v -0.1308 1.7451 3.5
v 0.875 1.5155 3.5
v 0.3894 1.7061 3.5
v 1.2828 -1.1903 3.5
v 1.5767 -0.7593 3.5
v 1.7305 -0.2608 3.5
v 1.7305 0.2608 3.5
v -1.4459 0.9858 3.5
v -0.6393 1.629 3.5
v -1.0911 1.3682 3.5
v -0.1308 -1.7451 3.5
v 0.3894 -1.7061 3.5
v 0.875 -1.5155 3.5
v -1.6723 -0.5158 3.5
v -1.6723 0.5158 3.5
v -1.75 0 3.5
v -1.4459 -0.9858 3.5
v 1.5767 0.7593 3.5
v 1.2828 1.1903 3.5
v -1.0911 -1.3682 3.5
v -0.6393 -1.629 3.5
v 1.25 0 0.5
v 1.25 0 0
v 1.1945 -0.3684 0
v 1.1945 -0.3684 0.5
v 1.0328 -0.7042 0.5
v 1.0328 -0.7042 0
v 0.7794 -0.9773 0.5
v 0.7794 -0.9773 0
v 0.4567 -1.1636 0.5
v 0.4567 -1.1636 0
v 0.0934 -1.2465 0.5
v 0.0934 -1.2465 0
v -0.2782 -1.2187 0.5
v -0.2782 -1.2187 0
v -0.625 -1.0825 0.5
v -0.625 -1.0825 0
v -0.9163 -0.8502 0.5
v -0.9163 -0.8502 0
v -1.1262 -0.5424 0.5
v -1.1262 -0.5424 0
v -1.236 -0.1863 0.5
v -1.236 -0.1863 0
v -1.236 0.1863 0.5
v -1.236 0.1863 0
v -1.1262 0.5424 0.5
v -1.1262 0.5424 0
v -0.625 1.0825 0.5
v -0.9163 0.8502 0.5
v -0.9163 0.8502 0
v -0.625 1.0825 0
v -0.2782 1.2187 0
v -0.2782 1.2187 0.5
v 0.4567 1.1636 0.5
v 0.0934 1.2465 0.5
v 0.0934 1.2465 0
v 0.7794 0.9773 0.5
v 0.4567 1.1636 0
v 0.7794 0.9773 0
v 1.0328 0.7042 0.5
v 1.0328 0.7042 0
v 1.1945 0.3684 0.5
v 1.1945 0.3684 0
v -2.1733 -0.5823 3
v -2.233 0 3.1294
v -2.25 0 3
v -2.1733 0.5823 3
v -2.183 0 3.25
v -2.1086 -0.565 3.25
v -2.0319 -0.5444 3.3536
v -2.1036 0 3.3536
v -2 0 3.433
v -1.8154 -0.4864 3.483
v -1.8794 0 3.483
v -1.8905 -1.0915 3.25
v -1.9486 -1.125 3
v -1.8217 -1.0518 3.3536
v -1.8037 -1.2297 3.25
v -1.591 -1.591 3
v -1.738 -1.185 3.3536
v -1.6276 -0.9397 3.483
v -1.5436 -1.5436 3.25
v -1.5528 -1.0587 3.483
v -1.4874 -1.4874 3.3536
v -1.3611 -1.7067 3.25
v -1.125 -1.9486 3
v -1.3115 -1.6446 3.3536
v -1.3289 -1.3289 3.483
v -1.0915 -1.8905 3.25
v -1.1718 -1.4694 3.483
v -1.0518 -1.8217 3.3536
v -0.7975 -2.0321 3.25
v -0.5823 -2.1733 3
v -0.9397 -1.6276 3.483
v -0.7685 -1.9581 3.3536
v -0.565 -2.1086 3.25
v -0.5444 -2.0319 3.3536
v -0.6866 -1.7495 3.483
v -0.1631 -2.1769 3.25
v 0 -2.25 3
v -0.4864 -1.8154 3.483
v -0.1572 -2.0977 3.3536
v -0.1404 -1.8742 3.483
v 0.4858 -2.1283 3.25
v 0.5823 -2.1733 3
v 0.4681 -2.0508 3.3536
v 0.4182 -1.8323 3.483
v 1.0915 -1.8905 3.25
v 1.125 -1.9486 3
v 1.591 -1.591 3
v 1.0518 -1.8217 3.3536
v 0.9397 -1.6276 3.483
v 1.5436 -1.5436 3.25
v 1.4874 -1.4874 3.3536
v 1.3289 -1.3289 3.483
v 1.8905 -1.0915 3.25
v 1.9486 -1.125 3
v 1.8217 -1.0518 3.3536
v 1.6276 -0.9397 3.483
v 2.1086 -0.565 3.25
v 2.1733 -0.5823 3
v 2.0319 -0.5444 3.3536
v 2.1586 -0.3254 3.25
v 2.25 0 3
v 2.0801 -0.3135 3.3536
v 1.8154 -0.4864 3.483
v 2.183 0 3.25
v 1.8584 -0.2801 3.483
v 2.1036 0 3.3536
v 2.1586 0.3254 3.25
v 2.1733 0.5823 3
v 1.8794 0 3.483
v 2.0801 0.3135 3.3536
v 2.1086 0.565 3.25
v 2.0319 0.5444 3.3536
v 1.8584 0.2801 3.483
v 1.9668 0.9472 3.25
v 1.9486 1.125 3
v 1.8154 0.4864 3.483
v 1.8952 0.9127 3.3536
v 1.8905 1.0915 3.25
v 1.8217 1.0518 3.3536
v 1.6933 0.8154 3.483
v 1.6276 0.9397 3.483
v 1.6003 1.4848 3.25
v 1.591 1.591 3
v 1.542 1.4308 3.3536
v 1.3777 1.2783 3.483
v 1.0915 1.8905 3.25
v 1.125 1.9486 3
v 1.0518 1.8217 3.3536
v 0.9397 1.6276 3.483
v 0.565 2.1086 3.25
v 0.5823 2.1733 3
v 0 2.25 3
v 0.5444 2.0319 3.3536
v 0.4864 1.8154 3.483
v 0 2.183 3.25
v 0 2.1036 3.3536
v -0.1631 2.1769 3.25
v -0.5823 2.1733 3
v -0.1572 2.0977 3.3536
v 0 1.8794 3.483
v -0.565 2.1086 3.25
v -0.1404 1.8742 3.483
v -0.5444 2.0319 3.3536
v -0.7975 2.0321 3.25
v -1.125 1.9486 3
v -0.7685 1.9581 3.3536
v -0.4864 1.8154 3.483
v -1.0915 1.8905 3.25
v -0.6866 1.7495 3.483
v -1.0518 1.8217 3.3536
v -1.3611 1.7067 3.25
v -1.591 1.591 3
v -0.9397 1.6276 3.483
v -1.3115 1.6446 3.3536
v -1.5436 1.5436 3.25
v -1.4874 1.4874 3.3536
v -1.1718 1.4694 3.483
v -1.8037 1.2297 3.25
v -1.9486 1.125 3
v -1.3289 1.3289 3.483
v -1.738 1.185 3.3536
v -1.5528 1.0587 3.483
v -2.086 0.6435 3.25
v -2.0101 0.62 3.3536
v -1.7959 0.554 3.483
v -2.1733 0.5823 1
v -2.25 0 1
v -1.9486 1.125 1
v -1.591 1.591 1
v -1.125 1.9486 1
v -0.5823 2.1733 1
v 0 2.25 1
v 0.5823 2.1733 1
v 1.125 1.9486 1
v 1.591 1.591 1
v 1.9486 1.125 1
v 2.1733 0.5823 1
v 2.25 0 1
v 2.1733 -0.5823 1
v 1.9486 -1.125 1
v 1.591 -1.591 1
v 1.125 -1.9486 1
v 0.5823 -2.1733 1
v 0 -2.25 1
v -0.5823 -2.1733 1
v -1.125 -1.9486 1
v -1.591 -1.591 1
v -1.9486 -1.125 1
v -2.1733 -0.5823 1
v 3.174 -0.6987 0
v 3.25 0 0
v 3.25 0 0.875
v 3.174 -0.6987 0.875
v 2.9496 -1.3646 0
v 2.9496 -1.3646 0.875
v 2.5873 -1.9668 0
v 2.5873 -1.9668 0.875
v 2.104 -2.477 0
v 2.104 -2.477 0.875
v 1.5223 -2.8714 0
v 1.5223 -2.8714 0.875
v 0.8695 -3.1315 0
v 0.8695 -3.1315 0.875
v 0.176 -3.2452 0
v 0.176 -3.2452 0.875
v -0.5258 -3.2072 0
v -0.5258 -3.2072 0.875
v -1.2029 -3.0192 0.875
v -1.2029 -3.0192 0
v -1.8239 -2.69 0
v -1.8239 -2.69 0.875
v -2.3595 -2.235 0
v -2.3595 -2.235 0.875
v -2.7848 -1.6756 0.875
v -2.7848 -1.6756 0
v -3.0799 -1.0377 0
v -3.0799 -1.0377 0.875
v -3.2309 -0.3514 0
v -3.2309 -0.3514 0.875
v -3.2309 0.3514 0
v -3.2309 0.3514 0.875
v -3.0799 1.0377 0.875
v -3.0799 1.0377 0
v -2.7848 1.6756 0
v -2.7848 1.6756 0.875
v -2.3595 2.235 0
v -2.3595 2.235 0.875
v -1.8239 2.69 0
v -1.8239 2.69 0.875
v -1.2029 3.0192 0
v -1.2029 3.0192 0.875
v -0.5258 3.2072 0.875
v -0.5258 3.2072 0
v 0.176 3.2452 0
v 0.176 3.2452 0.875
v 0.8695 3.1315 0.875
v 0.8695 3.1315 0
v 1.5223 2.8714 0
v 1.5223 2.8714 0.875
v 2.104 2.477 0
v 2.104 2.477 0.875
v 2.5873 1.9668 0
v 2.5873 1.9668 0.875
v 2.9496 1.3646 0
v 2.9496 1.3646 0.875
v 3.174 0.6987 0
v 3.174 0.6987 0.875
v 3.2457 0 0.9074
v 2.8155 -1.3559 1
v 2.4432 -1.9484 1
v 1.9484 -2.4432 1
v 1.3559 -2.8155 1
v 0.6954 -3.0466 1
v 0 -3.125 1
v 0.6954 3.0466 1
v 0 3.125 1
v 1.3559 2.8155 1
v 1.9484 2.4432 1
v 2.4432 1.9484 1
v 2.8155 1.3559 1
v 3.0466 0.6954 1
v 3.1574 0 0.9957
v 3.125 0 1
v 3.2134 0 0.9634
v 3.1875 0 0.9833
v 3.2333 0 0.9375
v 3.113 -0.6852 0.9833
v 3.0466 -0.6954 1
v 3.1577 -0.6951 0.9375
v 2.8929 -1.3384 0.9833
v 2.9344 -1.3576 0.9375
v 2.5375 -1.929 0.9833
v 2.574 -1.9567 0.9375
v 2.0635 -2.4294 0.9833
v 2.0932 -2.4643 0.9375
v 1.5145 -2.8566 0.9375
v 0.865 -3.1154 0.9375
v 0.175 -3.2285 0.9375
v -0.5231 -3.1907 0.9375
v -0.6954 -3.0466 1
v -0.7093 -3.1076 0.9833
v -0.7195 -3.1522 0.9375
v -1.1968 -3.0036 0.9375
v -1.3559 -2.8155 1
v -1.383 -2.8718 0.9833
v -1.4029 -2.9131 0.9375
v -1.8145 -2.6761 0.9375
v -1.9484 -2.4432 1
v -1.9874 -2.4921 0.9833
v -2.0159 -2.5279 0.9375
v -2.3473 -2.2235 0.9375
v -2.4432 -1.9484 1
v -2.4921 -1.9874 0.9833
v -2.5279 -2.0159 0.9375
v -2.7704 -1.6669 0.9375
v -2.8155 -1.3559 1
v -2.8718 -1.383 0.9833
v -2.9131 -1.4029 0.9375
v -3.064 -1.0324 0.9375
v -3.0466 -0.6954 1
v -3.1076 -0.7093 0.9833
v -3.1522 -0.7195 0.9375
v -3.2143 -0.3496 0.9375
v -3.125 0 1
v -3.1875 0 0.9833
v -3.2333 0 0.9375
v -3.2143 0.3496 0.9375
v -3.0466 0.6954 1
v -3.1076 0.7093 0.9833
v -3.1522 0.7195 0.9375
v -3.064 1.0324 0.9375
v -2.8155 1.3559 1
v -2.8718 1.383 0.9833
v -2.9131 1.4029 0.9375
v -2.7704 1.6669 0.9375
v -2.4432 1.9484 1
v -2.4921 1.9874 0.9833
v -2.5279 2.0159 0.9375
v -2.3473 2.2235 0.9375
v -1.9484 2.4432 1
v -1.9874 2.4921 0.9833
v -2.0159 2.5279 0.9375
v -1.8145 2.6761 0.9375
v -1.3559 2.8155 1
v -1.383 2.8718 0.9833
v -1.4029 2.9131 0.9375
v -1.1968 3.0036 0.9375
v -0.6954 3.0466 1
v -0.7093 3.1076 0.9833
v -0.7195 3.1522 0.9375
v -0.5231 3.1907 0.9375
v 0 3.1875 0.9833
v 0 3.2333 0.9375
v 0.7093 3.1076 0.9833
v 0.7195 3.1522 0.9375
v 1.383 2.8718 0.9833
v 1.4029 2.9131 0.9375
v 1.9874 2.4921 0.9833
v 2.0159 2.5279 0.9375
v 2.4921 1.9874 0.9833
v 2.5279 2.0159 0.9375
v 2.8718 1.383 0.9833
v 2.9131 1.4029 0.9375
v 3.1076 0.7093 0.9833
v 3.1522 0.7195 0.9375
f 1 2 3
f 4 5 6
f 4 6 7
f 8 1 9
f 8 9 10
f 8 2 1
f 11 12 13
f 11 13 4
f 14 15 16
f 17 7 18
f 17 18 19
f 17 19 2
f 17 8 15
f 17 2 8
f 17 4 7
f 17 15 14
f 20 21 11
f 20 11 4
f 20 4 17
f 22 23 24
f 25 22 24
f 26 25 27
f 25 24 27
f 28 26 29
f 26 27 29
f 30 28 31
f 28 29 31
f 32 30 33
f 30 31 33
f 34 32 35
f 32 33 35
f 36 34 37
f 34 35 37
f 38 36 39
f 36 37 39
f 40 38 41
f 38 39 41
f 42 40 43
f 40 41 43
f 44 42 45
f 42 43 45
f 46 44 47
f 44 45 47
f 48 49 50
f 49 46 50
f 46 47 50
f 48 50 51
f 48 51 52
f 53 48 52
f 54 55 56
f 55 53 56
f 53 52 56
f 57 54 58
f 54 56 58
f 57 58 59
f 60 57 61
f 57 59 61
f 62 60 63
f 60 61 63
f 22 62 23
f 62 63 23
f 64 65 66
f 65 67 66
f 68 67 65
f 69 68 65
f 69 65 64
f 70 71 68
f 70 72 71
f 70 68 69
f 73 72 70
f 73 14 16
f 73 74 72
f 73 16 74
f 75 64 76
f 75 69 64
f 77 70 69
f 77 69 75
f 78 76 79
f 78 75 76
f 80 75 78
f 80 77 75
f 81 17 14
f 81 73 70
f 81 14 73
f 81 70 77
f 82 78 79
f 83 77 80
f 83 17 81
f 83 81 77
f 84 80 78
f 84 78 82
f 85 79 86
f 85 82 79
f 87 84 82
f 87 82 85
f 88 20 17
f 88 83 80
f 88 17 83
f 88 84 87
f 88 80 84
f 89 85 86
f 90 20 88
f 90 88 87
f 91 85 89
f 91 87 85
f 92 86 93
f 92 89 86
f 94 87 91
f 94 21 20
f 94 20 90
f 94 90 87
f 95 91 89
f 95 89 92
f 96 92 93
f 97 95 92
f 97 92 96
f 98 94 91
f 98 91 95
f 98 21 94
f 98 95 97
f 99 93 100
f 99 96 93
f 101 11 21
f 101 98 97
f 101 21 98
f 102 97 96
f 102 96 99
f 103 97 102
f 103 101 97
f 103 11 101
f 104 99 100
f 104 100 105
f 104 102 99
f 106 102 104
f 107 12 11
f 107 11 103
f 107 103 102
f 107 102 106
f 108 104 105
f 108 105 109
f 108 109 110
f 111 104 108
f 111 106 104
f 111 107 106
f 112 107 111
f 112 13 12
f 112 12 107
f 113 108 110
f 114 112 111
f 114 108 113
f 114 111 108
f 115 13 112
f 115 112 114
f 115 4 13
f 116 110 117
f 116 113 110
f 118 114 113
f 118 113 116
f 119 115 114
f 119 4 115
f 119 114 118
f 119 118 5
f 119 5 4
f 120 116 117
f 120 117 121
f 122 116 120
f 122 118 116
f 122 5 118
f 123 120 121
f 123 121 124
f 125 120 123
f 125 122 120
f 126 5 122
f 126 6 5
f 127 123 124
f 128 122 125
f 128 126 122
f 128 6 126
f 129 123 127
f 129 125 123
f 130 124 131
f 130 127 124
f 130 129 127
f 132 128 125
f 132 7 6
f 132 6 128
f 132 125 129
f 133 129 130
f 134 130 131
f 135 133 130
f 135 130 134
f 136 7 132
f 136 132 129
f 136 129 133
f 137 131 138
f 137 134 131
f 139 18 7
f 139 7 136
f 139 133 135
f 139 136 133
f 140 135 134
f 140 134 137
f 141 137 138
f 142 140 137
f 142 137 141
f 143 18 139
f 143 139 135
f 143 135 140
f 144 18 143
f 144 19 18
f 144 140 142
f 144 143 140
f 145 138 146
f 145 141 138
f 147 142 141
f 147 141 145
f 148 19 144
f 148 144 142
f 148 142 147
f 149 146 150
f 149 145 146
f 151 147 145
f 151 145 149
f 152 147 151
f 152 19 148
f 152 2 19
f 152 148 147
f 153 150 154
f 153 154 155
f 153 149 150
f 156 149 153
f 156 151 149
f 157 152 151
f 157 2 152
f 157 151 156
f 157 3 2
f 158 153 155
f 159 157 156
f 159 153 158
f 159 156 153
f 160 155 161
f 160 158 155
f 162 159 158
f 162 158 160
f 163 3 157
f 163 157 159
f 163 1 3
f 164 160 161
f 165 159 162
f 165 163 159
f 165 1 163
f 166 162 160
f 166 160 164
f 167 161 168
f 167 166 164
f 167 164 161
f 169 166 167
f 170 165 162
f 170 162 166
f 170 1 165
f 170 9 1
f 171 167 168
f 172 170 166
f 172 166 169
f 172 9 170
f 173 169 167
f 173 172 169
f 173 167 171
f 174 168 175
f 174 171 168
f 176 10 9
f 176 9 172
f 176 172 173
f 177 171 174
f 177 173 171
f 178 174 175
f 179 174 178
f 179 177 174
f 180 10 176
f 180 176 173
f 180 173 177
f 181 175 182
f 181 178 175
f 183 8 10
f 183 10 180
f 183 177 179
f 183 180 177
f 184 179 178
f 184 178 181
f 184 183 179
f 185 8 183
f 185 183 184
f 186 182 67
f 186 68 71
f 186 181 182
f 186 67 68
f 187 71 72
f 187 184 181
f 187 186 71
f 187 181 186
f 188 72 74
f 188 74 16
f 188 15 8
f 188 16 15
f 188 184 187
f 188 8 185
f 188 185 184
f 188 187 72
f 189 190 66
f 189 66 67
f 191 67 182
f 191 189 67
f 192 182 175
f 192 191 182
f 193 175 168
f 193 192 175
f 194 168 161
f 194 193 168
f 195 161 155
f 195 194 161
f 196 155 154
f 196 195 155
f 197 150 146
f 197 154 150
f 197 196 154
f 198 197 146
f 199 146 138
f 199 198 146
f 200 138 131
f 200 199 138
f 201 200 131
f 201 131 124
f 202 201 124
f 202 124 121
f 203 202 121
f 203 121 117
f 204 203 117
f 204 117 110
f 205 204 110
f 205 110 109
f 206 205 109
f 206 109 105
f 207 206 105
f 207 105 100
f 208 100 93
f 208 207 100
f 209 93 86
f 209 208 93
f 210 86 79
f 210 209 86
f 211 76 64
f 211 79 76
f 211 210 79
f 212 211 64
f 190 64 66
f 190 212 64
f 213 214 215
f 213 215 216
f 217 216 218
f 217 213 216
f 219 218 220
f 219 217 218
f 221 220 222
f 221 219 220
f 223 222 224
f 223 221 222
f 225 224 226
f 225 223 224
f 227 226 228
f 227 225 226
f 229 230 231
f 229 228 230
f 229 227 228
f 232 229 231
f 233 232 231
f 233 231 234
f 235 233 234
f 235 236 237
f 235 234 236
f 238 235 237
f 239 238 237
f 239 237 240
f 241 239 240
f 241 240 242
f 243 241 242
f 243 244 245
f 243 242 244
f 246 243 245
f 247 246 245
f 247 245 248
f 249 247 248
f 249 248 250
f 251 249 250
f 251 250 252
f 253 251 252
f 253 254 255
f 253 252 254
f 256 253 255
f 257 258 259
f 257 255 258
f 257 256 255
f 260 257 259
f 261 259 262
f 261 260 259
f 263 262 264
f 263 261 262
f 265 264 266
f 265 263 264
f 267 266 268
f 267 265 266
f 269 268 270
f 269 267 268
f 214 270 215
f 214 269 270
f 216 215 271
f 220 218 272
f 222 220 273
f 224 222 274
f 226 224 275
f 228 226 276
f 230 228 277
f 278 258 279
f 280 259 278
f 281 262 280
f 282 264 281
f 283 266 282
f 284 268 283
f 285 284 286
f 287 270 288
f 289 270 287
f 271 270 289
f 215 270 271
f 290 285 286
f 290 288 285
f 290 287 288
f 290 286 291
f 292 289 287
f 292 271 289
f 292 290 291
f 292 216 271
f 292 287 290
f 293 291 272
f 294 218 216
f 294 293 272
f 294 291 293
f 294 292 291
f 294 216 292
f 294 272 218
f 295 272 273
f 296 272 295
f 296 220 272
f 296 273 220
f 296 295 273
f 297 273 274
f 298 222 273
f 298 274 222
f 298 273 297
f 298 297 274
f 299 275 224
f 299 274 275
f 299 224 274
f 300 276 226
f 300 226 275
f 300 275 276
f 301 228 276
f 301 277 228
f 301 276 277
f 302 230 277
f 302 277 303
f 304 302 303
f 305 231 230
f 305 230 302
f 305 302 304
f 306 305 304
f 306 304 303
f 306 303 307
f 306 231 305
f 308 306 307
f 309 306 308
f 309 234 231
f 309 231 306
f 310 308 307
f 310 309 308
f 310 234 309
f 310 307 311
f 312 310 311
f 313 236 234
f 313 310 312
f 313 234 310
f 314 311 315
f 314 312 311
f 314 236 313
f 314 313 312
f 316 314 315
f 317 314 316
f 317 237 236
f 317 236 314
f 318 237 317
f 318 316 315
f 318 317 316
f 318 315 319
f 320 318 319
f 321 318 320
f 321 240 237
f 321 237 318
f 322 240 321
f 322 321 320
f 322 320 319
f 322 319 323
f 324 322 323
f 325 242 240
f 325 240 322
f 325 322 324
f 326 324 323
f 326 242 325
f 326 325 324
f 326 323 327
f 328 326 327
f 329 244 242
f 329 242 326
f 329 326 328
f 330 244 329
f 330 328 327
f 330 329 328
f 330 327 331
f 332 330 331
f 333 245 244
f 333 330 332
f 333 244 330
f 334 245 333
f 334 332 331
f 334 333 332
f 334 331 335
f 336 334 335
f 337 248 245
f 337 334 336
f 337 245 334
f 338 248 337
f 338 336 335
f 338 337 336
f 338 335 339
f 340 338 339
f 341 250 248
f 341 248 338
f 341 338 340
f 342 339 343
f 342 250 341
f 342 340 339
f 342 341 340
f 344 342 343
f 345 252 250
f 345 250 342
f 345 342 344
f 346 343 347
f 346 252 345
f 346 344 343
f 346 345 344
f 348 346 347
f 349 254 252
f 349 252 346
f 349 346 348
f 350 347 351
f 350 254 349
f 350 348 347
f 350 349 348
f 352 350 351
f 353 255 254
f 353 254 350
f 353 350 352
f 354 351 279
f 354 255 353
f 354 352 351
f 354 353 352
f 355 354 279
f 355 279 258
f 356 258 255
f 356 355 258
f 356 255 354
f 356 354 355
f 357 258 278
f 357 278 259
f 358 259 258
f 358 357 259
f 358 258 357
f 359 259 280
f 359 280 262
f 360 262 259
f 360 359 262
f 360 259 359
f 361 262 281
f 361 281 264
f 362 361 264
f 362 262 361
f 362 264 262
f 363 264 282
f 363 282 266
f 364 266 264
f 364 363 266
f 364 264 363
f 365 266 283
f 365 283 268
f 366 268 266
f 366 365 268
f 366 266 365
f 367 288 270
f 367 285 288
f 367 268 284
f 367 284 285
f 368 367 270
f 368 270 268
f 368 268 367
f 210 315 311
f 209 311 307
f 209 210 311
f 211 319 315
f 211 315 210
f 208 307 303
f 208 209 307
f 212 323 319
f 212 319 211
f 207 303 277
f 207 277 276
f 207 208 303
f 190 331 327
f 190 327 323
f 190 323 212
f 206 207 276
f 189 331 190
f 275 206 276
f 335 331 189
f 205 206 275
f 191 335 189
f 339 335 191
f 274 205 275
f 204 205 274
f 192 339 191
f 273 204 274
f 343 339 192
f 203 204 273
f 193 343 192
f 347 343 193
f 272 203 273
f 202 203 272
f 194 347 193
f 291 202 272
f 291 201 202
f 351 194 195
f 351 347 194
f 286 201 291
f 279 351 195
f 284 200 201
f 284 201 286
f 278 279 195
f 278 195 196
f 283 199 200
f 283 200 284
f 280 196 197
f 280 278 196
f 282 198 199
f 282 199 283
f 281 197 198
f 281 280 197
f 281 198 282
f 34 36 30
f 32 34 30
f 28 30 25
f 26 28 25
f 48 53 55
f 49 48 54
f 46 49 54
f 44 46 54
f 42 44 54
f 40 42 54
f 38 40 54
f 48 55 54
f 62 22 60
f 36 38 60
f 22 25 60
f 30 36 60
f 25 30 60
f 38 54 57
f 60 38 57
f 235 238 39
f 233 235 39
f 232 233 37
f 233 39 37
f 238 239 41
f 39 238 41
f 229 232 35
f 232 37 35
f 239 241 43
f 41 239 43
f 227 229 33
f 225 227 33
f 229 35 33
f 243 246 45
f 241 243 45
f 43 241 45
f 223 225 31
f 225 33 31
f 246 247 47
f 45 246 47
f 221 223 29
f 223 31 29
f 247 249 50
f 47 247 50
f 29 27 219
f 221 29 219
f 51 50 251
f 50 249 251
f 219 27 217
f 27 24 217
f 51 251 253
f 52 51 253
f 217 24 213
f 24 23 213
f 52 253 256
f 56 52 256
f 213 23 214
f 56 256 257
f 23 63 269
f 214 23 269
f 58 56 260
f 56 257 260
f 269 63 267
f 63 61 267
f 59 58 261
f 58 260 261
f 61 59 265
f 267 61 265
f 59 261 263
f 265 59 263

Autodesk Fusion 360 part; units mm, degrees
sketch "Sketch1" plane through (0, 0, 0) normal (0, 0, 1) x (1, 0, 0)
  circle A0 centre (0, 0) radius 3.25
  dimension "d1" = 6.5
extrude "Extrude1" add sketch "Sketch1" along normal blind 1
sketch "Sketch2" plane through (0, 0, 1) normal (0, 0, 1) x (-1, 0, 0)
  circle A0 centre (0, 0) radius 3.25
  circle A1 centre (0, 0) radius 2.25
  dimension "d4" = 4.5
extrude "Extrude2" add sketch "Sketch2" along normal blind 2.5 contours A1
fillet "Fillet1" radius 0.5 1 edges at (2.0977, 0.8136, 3.5)
fillet "Fillet2" radius 0.125 1 edges at (-3.0301, -1.1753, 1)
sketch "Sketch3" plane through (0, 0, 0) normal (0, 0, 1) x (1, 0, 0)
  circle A0 centre (0, 0) radius 1.25
  dimension "d11" = 2.5
extrude "Extrude3" cut sketch "Sketch3" along normal blind 0.5
